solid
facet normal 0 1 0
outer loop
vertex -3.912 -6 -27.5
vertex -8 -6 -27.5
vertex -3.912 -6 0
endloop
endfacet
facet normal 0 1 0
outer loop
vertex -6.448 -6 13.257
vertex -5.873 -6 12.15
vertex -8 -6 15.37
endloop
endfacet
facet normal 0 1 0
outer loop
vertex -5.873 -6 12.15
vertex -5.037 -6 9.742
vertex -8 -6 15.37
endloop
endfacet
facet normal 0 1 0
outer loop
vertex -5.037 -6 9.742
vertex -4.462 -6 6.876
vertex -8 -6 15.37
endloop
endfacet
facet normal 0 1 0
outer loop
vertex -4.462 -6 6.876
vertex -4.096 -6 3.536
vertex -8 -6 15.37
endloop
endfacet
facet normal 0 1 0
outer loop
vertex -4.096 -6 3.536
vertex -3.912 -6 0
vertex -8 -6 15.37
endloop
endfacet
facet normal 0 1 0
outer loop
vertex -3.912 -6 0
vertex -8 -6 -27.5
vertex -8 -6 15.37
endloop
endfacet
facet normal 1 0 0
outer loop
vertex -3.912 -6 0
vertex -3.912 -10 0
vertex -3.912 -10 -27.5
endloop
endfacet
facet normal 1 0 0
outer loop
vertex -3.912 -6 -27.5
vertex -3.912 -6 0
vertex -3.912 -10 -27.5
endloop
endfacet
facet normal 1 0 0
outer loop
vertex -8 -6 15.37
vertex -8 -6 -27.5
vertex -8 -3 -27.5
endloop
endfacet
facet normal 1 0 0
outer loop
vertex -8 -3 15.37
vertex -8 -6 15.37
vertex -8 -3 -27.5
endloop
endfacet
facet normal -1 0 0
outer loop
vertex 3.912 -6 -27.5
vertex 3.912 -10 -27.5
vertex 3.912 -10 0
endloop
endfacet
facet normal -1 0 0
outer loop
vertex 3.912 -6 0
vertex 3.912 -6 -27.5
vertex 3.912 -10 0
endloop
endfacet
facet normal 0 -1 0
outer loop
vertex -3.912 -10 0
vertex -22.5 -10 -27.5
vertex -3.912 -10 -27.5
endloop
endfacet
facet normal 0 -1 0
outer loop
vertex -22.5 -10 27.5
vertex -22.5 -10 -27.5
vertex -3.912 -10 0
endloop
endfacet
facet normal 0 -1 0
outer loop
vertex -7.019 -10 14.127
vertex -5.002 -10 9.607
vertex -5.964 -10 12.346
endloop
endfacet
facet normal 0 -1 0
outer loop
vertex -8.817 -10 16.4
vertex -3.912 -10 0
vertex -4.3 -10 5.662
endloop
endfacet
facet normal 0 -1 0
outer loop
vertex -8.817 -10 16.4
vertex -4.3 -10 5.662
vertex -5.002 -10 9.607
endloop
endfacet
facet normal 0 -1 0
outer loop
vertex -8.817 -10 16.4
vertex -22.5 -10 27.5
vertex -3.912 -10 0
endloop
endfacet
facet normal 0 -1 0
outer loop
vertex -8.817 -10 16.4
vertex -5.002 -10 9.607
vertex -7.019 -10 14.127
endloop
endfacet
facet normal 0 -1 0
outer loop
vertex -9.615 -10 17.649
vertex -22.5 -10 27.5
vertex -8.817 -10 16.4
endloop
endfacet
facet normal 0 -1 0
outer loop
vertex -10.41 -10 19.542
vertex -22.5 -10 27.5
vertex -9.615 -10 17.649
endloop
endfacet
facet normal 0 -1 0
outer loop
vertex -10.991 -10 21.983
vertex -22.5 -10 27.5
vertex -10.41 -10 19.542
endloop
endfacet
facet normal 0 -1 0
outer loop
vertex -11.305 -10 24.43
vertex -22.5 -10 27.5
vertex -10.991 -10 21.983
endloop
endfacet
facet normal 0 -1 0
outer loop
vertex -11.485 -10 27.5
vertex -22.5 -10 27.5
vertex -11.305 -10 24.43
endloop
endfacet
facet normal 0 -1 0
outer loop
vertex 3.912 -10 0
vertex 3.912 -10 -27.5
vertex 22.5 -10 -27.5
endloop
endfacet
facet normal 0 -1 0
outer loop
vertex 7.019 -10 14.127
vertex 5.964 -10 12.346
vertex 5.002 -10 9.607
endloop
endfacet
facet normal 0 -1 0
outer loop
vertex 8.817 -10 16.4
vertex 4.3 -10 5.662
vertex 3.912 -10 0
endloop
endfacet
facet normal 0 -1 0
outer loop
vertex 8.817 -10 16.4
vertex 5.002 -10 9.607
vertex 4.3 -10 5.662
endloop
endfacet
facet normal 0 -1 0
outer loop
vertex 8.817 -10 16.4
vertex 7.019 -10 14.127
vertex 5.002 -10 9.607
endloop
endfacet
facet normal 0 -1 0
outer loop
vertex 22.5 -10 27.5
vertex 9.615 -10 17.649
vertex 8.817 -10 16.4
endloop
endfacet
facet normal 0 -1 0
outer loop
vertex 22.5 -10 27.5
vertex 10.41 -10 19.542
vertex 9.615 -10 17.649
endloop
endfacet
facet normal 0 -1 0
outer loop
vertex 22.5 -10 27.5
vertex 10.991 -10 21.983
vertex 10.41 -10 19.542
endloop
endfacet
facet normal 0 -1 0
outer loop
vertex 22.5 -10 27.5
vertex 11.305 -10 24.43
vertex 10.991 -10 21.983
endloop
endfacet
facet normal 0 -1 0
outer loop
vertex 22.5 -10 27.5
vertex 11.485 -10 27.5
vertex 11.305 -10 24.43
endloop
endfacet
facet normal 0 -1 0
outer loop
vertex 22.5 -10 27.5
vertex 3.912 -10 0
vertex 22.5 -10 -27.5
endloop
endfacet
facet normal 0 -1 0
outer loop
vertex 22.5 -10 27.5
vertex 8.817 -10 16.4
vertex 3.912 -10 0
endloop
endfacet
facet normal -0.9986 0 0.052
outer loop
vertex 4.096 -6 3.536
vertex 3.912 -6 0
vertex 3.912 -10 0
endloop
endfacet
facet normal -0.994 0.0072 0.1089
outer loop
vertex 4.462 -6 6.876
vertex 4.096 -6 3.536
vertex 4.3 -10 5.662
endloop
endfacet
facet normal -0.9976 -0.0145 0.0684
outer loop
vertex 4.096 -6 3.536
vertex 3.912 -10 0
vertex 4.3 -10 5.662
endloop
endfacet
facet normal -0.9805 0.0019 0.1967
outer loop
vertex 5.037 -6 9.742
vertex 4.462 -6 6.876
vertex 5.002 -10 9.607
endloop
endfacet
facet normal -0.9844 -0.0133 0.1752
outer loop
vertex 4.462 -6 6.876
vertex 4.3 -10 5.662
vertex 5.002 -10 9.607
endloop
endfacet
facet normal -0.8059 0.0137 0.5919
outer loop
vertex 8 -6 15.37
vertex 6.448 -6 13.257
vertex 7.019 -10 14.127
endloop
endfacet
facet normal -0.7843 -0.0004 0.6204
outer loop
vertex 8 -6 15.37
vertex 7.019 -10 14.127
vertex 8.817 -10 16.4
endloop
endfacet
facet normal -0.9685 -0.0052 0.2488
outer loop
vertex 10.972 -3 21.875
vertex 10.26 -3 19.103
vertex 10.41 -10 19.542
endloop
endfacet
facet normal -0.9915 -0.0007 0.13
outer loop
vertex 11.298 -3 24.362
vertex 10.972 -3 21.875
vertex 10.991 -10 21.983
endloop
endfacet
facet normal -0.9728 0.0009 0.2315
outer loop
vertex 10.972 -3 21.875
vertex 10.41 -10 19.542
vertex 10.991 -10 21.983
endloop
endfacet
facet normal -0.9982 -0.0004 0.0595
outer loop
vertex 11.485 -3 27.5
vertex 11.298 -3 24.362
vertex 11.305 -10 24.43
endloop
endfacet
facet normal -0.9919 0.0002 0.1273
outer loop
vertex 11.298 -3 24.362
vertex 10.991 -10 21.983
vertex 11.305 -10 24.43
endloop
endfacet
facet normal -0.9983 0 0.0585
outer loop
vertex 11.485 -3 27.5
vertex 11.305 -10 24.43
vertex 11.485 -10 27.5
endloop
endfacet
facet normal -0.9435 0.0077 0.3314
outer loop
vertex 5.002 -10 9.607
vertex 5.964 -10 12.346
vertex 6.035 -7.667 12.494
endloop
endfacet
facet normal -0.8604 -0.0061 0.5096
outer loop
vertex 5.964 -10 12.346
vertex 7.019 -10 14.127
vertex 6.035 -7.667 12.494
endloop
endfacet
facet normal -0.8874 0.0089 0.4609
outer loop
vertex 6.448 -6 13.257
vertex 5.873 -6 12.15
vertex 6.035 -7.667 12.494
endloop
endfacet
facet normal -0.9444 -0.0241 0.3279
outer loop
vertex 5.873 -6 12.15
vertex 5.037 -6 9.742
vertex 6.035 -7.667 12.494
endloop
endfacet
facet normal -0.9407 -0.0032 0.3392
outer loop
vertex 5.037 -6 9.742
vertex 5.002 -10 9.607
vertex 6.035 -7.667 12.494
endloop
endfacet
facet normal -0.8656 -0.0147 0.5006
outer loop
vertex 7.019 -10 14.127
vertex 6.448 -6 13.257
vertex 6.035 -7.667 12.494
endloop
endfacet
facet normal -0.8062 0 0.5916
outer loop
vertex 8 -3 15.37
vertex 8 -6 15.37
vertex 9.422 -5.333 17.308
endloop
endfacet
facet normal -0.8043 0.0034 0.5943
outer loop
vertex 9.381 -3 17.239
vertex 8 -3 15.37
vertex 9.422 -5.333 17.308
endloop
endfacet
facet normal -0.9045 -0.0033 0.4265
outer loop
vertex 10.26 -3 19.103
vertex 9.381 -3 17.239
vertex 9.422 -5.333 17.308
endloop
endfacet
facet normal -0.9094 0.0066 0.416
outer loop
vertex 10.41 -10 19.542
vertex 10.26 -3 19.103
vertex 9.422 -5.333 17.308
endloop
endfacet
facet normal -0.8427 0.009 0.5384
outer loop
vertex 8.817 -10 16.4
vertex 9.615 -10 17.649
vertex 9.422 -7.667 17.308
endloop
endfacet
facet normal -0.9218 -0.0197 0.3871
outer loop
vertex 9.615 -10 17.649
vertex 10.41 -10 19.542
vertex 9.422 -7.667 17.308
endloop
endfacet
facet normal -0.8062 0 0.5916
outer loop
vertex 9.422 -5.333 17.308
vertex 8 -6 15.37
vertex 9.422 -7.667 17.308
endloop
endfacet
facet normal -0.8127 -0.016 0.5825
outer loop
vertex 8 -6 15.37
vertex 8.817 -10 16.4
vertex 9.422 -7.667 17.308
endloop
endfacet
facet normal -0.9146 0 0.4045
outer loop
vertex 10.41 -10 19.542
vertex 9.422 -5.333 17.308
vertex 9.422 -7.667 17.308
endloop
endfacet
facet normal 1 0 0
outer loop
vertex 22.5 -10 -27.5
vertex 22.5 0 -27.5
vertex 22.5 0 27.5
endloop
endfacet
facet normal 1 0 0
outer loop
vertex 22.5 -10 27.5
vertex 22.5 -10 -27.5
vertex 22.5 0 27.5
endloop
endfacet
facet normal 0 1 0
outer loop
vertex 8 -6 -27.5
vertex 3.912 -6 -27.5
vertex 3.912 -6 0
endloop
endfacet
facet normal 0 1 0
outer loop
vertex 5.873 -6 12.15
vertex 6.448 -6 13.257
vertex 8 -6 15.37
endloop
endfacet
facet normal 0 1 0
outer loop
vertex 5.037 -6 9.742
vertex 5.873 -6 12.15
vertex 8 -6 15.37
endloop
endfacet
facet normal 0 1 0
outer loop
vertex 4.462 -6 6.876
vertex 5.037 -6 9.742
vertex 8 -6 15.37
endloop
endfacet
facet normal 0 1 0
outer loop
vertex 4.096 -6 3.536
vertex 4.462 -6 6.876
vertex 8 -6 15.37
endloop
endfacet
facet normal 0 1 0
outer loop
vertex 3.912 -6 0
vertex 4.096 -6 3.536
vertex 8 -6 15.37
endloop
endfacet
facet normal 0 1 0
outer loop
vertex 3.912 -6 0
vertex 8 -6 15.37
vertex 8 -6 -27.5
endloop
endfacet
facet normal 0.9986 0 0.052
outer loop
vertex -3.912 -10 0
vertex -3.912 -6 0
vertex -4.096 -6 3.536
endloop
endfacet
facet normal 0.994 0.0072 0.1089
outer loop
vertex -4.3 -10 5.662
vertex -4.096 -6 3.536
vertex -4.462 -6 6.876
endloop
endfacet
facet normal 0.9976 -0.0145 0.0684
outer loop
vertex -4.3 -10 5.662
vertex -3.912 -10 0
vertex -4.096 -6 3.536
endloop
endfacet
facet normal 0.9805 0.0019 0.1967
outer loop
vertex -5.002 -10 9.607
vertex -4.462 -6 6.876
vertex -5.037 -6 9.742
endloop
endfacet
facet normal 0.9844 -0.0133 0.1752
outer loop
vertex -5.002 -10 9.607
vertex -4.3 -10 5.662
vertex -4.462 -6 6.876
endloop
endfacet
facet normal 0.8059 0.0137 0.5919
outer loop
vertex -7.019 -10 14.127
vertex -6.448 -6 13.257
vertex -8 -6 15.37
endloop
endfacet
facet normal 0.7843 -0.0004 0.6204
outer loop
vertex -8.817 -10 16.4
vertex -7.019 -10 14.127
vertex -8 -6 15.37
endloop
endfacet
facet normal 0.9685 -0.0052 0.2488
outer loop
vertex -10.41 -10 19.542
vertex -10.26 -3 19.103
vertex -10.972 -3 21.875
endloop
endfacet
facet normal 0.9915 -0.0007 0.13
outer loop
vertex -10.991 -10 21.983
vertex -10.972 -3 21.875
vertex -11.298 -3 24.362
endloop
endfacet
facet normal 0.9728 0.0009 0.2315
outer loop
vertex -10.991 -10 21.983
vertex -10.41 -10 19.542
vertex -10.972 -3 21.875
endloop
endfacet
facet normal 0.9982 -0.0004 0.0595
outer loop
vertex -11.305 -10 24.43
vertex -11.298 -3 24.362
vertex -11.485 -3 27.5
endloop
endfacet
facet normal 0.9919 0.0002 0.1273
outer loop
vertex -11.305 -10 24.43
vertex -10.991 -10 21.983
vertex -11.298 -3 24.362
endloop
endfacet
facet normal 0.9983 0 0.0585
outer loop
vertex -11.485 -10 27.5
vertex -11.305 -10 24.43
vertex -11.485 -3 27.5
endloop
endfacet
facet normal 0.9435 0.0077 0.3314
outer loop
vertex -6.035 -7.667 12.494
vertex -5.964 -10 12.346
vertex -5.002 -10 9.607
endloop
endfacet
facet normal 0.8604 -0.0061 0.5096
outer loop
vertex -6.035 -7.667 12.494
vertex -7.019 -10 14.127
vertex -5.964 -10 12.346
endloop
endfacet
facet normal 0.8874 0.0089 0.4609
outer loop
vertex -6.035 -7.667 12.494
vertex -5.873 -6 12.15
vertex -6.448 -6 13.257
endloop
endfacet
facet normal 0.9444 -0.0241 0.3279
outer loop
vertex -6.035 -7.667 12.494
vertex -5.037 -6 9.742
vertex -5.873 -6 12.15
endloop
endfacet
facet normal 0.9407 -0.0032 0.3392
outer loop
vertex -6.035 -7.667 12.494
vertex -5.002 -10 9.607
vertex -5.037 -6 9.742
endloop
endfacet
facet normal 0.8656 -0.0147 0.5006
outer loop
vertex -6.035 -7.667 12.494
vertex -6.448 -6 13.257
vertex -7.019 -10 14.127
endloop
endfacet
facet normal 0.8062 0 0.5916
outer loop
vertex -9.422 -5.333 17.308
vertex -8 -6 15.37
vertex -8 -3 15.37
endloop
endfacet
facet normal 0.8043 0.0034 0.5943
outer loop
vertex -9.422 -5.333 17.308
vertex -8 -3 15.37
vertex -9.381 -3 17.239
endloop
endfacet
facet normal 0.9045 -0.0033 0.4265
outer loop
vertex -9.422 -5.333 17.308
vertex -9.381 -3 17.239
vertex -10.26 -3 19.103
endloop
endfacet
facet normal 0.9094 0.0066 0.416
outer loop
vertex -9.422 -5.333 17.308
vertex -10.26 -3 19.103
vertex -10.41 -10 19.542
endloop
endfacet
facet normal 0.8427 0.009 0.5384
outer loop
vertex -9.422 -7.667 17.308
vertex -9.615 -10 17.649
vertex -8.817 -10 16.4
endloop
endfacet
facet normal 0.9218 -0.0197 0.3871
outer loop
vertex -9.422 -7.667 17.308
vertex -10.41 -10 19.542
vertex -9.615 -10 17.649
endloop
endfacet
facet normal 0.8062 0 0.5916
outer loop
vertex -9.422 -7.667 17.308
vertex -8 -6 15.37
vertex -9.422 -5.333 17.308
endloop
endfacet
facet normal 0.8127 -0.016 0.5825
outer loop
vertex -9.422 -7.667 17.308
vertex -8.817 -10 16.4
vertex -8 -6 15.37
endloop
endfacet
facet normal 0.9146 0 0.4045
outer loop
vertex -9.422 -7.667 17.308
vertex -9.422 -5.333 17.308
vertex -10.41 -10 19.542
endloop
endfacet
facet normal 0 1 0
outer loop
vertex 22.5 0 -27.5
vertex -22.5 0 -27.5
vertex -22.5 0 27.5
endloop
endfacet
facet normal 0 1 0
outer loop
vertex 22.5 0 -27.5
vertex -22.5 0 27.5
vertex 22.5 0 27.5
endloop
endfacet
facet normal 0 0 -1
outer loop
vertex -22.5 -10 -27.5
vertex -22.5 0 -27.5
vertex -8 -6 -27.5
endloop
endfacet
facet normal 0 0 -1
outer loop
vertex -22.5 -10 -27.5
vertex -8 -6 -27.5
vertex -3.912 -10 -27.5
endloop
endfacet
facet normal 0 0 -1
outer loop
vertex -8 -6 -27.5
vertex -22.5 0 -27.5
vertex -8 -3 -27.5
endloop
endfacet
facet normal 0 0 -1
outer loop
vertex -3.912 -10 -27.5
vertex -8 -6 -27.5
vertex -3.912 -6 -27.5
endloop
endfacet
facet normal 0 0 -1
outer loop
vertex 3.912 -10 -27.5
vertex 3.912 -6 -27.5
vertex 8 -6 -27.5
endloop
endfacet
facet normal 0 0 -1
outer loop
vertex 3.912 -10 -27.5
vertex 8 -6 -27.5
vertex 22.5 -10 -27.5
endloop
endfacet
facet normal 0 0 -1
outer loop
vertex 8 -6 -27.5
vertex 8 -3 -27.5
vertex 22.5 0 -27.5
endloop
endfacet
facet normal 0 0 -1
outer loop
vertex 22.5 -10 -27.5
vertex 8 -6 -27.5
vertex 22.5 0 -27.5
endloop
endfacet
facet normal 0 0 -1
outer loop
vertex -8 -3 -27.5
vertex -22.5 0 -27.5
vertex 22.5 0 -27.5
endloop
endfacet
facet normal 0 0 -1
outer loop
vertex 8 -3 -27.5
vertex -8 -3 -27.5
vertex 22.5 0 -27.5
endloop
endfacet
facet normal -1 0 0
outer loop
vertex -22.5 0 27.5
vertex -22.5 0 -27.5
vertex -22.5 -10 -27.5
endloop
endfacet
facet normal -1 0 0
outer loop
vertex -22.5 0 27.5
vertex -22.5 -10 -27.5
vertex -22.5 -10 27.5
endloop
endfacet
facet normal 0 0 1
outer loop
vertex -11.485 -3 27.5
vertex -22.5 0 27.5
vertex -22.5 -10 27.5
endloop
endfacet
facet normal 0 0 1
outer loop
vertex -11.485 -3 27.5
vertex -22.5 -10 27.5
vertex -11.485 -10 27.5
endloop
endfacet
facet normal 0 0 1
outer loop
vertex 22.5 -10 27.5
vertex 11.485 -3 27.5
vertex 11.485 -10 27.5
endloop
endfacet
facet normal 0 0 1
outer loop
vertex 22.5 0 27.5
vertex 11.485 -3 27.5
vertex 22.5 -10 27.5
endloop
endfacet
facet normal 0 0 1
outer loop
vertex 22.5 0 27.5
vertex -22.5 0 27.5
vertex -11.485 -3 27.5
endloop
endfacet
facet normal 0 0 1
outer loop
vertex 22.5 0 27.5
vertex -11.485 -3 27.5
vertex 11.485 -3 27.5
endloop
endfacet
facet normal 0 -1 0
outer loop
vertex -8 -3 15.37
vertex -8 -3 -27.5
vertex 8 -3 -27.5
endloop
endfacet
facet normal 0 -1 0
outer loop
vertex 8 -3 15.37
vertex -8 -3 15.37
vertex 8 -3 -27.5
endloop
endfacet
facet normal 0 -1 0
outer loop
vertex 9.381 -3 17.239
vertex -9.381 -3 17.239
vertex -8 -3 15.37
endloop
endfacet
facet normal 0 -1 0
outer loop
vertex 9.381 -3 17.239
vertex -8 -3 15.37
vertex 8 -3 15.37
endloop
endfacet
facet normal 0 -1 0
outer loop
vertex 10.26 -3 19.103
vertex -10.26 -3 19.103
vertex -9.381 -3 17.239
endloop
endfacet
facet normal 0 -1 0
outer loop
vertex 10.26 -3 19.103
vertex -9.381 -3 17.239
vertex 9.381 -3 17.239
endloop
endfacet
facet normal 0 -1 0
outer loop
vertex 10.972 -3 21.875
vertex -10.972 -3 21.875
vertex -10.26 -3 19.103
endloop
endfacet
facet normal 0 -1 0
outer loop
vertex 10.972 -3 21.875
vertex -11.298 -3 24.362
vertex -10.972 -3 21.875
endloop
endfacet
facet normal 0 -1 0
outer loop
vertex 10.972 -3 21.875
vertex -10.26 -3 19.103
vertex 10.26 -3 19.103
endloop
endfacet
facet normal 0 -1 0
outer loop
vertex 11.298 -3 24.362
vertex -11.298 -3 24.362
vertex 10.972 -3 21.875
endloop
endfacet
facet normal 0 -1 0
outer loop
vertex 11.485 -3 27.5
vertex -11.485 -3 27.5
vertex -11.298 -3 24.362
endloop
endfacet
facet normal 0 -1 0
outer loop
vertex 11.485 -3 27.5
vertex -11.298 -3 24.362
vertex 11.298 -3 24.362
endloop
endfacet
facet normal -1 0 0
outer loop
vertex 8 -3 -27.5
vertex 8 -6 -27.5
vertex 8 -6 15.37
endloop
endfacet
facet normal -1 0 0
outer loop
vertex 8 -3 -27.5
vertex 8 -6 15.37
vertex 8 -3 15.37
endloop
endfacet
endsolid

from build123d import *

# Parameters (mm, degrees)
F0_W     = 45
F0_H     = 55
F1_DEPTH = 10
F3_DEPTH = 7
F4_W     = 16
F4_H     = 3
F5_DEPTH = 55.0010001


with BuildPart() as f1:
    # F0 (on Front) → F1 (new body)
    with BuildSketch(Plane.XZ):
        Rectangle(F0_W, F0_H)
    extrude(amount=F1_DEPTH)

    # F2 (on face) → F3 (cut)
    with BuildSketch(Plane.XZ.offset(10)):
        with BuildLine():
            Line((3.9123152383, -27.5), (3.9123152383, 0))
            add(Edge.make_bspline(
                [(3.9123152383, 0), (4.5414378197, 20.6852698078), (10.9457386037, 10.2673236529), (11.484915749, 27.5)],
                knots=[0, 0, 0, 0, 28.5235740835, 28.5235740835, 28.5235740835, 28.5235740835], degree=3))
            Line((11.484915749, 27.5), (-11.484915749, 27.5))
            add(Edge.make_bspline(
                [(-3.9123152383, 0), (-4.5414378197, 20.6852698078), (-10.9457386037, 10.2673236529), (-11.484915749, 27.5)],
                knots=[0, 0, 0, 0, 28.5235740835, 28.5235740835, 28.5235740835, 28.5235740835], degree=3))
            Line((-3.9123152383, 0), (-3.9123152383, -27.5))
            Line((-3.9123152383, -27.5), (0, -27.5))
            Line((0, -27.5), (3.9123152383, -27.5))
        make_face()
    extrude(amount=-F3_DEPTH, mode=Mode.SUBTRACT)

    # F4 (on face) → F5 (cut, through all)
    with BuildSketch(Plane.XY.offset(27.5)):
        with Locations((0, -4.5)):
            Rectangle(F4_W, F4_H)
    extrude(amount=-F5_DEPTH, mode=Mode.SUBTRACT)


solid = f1.part
